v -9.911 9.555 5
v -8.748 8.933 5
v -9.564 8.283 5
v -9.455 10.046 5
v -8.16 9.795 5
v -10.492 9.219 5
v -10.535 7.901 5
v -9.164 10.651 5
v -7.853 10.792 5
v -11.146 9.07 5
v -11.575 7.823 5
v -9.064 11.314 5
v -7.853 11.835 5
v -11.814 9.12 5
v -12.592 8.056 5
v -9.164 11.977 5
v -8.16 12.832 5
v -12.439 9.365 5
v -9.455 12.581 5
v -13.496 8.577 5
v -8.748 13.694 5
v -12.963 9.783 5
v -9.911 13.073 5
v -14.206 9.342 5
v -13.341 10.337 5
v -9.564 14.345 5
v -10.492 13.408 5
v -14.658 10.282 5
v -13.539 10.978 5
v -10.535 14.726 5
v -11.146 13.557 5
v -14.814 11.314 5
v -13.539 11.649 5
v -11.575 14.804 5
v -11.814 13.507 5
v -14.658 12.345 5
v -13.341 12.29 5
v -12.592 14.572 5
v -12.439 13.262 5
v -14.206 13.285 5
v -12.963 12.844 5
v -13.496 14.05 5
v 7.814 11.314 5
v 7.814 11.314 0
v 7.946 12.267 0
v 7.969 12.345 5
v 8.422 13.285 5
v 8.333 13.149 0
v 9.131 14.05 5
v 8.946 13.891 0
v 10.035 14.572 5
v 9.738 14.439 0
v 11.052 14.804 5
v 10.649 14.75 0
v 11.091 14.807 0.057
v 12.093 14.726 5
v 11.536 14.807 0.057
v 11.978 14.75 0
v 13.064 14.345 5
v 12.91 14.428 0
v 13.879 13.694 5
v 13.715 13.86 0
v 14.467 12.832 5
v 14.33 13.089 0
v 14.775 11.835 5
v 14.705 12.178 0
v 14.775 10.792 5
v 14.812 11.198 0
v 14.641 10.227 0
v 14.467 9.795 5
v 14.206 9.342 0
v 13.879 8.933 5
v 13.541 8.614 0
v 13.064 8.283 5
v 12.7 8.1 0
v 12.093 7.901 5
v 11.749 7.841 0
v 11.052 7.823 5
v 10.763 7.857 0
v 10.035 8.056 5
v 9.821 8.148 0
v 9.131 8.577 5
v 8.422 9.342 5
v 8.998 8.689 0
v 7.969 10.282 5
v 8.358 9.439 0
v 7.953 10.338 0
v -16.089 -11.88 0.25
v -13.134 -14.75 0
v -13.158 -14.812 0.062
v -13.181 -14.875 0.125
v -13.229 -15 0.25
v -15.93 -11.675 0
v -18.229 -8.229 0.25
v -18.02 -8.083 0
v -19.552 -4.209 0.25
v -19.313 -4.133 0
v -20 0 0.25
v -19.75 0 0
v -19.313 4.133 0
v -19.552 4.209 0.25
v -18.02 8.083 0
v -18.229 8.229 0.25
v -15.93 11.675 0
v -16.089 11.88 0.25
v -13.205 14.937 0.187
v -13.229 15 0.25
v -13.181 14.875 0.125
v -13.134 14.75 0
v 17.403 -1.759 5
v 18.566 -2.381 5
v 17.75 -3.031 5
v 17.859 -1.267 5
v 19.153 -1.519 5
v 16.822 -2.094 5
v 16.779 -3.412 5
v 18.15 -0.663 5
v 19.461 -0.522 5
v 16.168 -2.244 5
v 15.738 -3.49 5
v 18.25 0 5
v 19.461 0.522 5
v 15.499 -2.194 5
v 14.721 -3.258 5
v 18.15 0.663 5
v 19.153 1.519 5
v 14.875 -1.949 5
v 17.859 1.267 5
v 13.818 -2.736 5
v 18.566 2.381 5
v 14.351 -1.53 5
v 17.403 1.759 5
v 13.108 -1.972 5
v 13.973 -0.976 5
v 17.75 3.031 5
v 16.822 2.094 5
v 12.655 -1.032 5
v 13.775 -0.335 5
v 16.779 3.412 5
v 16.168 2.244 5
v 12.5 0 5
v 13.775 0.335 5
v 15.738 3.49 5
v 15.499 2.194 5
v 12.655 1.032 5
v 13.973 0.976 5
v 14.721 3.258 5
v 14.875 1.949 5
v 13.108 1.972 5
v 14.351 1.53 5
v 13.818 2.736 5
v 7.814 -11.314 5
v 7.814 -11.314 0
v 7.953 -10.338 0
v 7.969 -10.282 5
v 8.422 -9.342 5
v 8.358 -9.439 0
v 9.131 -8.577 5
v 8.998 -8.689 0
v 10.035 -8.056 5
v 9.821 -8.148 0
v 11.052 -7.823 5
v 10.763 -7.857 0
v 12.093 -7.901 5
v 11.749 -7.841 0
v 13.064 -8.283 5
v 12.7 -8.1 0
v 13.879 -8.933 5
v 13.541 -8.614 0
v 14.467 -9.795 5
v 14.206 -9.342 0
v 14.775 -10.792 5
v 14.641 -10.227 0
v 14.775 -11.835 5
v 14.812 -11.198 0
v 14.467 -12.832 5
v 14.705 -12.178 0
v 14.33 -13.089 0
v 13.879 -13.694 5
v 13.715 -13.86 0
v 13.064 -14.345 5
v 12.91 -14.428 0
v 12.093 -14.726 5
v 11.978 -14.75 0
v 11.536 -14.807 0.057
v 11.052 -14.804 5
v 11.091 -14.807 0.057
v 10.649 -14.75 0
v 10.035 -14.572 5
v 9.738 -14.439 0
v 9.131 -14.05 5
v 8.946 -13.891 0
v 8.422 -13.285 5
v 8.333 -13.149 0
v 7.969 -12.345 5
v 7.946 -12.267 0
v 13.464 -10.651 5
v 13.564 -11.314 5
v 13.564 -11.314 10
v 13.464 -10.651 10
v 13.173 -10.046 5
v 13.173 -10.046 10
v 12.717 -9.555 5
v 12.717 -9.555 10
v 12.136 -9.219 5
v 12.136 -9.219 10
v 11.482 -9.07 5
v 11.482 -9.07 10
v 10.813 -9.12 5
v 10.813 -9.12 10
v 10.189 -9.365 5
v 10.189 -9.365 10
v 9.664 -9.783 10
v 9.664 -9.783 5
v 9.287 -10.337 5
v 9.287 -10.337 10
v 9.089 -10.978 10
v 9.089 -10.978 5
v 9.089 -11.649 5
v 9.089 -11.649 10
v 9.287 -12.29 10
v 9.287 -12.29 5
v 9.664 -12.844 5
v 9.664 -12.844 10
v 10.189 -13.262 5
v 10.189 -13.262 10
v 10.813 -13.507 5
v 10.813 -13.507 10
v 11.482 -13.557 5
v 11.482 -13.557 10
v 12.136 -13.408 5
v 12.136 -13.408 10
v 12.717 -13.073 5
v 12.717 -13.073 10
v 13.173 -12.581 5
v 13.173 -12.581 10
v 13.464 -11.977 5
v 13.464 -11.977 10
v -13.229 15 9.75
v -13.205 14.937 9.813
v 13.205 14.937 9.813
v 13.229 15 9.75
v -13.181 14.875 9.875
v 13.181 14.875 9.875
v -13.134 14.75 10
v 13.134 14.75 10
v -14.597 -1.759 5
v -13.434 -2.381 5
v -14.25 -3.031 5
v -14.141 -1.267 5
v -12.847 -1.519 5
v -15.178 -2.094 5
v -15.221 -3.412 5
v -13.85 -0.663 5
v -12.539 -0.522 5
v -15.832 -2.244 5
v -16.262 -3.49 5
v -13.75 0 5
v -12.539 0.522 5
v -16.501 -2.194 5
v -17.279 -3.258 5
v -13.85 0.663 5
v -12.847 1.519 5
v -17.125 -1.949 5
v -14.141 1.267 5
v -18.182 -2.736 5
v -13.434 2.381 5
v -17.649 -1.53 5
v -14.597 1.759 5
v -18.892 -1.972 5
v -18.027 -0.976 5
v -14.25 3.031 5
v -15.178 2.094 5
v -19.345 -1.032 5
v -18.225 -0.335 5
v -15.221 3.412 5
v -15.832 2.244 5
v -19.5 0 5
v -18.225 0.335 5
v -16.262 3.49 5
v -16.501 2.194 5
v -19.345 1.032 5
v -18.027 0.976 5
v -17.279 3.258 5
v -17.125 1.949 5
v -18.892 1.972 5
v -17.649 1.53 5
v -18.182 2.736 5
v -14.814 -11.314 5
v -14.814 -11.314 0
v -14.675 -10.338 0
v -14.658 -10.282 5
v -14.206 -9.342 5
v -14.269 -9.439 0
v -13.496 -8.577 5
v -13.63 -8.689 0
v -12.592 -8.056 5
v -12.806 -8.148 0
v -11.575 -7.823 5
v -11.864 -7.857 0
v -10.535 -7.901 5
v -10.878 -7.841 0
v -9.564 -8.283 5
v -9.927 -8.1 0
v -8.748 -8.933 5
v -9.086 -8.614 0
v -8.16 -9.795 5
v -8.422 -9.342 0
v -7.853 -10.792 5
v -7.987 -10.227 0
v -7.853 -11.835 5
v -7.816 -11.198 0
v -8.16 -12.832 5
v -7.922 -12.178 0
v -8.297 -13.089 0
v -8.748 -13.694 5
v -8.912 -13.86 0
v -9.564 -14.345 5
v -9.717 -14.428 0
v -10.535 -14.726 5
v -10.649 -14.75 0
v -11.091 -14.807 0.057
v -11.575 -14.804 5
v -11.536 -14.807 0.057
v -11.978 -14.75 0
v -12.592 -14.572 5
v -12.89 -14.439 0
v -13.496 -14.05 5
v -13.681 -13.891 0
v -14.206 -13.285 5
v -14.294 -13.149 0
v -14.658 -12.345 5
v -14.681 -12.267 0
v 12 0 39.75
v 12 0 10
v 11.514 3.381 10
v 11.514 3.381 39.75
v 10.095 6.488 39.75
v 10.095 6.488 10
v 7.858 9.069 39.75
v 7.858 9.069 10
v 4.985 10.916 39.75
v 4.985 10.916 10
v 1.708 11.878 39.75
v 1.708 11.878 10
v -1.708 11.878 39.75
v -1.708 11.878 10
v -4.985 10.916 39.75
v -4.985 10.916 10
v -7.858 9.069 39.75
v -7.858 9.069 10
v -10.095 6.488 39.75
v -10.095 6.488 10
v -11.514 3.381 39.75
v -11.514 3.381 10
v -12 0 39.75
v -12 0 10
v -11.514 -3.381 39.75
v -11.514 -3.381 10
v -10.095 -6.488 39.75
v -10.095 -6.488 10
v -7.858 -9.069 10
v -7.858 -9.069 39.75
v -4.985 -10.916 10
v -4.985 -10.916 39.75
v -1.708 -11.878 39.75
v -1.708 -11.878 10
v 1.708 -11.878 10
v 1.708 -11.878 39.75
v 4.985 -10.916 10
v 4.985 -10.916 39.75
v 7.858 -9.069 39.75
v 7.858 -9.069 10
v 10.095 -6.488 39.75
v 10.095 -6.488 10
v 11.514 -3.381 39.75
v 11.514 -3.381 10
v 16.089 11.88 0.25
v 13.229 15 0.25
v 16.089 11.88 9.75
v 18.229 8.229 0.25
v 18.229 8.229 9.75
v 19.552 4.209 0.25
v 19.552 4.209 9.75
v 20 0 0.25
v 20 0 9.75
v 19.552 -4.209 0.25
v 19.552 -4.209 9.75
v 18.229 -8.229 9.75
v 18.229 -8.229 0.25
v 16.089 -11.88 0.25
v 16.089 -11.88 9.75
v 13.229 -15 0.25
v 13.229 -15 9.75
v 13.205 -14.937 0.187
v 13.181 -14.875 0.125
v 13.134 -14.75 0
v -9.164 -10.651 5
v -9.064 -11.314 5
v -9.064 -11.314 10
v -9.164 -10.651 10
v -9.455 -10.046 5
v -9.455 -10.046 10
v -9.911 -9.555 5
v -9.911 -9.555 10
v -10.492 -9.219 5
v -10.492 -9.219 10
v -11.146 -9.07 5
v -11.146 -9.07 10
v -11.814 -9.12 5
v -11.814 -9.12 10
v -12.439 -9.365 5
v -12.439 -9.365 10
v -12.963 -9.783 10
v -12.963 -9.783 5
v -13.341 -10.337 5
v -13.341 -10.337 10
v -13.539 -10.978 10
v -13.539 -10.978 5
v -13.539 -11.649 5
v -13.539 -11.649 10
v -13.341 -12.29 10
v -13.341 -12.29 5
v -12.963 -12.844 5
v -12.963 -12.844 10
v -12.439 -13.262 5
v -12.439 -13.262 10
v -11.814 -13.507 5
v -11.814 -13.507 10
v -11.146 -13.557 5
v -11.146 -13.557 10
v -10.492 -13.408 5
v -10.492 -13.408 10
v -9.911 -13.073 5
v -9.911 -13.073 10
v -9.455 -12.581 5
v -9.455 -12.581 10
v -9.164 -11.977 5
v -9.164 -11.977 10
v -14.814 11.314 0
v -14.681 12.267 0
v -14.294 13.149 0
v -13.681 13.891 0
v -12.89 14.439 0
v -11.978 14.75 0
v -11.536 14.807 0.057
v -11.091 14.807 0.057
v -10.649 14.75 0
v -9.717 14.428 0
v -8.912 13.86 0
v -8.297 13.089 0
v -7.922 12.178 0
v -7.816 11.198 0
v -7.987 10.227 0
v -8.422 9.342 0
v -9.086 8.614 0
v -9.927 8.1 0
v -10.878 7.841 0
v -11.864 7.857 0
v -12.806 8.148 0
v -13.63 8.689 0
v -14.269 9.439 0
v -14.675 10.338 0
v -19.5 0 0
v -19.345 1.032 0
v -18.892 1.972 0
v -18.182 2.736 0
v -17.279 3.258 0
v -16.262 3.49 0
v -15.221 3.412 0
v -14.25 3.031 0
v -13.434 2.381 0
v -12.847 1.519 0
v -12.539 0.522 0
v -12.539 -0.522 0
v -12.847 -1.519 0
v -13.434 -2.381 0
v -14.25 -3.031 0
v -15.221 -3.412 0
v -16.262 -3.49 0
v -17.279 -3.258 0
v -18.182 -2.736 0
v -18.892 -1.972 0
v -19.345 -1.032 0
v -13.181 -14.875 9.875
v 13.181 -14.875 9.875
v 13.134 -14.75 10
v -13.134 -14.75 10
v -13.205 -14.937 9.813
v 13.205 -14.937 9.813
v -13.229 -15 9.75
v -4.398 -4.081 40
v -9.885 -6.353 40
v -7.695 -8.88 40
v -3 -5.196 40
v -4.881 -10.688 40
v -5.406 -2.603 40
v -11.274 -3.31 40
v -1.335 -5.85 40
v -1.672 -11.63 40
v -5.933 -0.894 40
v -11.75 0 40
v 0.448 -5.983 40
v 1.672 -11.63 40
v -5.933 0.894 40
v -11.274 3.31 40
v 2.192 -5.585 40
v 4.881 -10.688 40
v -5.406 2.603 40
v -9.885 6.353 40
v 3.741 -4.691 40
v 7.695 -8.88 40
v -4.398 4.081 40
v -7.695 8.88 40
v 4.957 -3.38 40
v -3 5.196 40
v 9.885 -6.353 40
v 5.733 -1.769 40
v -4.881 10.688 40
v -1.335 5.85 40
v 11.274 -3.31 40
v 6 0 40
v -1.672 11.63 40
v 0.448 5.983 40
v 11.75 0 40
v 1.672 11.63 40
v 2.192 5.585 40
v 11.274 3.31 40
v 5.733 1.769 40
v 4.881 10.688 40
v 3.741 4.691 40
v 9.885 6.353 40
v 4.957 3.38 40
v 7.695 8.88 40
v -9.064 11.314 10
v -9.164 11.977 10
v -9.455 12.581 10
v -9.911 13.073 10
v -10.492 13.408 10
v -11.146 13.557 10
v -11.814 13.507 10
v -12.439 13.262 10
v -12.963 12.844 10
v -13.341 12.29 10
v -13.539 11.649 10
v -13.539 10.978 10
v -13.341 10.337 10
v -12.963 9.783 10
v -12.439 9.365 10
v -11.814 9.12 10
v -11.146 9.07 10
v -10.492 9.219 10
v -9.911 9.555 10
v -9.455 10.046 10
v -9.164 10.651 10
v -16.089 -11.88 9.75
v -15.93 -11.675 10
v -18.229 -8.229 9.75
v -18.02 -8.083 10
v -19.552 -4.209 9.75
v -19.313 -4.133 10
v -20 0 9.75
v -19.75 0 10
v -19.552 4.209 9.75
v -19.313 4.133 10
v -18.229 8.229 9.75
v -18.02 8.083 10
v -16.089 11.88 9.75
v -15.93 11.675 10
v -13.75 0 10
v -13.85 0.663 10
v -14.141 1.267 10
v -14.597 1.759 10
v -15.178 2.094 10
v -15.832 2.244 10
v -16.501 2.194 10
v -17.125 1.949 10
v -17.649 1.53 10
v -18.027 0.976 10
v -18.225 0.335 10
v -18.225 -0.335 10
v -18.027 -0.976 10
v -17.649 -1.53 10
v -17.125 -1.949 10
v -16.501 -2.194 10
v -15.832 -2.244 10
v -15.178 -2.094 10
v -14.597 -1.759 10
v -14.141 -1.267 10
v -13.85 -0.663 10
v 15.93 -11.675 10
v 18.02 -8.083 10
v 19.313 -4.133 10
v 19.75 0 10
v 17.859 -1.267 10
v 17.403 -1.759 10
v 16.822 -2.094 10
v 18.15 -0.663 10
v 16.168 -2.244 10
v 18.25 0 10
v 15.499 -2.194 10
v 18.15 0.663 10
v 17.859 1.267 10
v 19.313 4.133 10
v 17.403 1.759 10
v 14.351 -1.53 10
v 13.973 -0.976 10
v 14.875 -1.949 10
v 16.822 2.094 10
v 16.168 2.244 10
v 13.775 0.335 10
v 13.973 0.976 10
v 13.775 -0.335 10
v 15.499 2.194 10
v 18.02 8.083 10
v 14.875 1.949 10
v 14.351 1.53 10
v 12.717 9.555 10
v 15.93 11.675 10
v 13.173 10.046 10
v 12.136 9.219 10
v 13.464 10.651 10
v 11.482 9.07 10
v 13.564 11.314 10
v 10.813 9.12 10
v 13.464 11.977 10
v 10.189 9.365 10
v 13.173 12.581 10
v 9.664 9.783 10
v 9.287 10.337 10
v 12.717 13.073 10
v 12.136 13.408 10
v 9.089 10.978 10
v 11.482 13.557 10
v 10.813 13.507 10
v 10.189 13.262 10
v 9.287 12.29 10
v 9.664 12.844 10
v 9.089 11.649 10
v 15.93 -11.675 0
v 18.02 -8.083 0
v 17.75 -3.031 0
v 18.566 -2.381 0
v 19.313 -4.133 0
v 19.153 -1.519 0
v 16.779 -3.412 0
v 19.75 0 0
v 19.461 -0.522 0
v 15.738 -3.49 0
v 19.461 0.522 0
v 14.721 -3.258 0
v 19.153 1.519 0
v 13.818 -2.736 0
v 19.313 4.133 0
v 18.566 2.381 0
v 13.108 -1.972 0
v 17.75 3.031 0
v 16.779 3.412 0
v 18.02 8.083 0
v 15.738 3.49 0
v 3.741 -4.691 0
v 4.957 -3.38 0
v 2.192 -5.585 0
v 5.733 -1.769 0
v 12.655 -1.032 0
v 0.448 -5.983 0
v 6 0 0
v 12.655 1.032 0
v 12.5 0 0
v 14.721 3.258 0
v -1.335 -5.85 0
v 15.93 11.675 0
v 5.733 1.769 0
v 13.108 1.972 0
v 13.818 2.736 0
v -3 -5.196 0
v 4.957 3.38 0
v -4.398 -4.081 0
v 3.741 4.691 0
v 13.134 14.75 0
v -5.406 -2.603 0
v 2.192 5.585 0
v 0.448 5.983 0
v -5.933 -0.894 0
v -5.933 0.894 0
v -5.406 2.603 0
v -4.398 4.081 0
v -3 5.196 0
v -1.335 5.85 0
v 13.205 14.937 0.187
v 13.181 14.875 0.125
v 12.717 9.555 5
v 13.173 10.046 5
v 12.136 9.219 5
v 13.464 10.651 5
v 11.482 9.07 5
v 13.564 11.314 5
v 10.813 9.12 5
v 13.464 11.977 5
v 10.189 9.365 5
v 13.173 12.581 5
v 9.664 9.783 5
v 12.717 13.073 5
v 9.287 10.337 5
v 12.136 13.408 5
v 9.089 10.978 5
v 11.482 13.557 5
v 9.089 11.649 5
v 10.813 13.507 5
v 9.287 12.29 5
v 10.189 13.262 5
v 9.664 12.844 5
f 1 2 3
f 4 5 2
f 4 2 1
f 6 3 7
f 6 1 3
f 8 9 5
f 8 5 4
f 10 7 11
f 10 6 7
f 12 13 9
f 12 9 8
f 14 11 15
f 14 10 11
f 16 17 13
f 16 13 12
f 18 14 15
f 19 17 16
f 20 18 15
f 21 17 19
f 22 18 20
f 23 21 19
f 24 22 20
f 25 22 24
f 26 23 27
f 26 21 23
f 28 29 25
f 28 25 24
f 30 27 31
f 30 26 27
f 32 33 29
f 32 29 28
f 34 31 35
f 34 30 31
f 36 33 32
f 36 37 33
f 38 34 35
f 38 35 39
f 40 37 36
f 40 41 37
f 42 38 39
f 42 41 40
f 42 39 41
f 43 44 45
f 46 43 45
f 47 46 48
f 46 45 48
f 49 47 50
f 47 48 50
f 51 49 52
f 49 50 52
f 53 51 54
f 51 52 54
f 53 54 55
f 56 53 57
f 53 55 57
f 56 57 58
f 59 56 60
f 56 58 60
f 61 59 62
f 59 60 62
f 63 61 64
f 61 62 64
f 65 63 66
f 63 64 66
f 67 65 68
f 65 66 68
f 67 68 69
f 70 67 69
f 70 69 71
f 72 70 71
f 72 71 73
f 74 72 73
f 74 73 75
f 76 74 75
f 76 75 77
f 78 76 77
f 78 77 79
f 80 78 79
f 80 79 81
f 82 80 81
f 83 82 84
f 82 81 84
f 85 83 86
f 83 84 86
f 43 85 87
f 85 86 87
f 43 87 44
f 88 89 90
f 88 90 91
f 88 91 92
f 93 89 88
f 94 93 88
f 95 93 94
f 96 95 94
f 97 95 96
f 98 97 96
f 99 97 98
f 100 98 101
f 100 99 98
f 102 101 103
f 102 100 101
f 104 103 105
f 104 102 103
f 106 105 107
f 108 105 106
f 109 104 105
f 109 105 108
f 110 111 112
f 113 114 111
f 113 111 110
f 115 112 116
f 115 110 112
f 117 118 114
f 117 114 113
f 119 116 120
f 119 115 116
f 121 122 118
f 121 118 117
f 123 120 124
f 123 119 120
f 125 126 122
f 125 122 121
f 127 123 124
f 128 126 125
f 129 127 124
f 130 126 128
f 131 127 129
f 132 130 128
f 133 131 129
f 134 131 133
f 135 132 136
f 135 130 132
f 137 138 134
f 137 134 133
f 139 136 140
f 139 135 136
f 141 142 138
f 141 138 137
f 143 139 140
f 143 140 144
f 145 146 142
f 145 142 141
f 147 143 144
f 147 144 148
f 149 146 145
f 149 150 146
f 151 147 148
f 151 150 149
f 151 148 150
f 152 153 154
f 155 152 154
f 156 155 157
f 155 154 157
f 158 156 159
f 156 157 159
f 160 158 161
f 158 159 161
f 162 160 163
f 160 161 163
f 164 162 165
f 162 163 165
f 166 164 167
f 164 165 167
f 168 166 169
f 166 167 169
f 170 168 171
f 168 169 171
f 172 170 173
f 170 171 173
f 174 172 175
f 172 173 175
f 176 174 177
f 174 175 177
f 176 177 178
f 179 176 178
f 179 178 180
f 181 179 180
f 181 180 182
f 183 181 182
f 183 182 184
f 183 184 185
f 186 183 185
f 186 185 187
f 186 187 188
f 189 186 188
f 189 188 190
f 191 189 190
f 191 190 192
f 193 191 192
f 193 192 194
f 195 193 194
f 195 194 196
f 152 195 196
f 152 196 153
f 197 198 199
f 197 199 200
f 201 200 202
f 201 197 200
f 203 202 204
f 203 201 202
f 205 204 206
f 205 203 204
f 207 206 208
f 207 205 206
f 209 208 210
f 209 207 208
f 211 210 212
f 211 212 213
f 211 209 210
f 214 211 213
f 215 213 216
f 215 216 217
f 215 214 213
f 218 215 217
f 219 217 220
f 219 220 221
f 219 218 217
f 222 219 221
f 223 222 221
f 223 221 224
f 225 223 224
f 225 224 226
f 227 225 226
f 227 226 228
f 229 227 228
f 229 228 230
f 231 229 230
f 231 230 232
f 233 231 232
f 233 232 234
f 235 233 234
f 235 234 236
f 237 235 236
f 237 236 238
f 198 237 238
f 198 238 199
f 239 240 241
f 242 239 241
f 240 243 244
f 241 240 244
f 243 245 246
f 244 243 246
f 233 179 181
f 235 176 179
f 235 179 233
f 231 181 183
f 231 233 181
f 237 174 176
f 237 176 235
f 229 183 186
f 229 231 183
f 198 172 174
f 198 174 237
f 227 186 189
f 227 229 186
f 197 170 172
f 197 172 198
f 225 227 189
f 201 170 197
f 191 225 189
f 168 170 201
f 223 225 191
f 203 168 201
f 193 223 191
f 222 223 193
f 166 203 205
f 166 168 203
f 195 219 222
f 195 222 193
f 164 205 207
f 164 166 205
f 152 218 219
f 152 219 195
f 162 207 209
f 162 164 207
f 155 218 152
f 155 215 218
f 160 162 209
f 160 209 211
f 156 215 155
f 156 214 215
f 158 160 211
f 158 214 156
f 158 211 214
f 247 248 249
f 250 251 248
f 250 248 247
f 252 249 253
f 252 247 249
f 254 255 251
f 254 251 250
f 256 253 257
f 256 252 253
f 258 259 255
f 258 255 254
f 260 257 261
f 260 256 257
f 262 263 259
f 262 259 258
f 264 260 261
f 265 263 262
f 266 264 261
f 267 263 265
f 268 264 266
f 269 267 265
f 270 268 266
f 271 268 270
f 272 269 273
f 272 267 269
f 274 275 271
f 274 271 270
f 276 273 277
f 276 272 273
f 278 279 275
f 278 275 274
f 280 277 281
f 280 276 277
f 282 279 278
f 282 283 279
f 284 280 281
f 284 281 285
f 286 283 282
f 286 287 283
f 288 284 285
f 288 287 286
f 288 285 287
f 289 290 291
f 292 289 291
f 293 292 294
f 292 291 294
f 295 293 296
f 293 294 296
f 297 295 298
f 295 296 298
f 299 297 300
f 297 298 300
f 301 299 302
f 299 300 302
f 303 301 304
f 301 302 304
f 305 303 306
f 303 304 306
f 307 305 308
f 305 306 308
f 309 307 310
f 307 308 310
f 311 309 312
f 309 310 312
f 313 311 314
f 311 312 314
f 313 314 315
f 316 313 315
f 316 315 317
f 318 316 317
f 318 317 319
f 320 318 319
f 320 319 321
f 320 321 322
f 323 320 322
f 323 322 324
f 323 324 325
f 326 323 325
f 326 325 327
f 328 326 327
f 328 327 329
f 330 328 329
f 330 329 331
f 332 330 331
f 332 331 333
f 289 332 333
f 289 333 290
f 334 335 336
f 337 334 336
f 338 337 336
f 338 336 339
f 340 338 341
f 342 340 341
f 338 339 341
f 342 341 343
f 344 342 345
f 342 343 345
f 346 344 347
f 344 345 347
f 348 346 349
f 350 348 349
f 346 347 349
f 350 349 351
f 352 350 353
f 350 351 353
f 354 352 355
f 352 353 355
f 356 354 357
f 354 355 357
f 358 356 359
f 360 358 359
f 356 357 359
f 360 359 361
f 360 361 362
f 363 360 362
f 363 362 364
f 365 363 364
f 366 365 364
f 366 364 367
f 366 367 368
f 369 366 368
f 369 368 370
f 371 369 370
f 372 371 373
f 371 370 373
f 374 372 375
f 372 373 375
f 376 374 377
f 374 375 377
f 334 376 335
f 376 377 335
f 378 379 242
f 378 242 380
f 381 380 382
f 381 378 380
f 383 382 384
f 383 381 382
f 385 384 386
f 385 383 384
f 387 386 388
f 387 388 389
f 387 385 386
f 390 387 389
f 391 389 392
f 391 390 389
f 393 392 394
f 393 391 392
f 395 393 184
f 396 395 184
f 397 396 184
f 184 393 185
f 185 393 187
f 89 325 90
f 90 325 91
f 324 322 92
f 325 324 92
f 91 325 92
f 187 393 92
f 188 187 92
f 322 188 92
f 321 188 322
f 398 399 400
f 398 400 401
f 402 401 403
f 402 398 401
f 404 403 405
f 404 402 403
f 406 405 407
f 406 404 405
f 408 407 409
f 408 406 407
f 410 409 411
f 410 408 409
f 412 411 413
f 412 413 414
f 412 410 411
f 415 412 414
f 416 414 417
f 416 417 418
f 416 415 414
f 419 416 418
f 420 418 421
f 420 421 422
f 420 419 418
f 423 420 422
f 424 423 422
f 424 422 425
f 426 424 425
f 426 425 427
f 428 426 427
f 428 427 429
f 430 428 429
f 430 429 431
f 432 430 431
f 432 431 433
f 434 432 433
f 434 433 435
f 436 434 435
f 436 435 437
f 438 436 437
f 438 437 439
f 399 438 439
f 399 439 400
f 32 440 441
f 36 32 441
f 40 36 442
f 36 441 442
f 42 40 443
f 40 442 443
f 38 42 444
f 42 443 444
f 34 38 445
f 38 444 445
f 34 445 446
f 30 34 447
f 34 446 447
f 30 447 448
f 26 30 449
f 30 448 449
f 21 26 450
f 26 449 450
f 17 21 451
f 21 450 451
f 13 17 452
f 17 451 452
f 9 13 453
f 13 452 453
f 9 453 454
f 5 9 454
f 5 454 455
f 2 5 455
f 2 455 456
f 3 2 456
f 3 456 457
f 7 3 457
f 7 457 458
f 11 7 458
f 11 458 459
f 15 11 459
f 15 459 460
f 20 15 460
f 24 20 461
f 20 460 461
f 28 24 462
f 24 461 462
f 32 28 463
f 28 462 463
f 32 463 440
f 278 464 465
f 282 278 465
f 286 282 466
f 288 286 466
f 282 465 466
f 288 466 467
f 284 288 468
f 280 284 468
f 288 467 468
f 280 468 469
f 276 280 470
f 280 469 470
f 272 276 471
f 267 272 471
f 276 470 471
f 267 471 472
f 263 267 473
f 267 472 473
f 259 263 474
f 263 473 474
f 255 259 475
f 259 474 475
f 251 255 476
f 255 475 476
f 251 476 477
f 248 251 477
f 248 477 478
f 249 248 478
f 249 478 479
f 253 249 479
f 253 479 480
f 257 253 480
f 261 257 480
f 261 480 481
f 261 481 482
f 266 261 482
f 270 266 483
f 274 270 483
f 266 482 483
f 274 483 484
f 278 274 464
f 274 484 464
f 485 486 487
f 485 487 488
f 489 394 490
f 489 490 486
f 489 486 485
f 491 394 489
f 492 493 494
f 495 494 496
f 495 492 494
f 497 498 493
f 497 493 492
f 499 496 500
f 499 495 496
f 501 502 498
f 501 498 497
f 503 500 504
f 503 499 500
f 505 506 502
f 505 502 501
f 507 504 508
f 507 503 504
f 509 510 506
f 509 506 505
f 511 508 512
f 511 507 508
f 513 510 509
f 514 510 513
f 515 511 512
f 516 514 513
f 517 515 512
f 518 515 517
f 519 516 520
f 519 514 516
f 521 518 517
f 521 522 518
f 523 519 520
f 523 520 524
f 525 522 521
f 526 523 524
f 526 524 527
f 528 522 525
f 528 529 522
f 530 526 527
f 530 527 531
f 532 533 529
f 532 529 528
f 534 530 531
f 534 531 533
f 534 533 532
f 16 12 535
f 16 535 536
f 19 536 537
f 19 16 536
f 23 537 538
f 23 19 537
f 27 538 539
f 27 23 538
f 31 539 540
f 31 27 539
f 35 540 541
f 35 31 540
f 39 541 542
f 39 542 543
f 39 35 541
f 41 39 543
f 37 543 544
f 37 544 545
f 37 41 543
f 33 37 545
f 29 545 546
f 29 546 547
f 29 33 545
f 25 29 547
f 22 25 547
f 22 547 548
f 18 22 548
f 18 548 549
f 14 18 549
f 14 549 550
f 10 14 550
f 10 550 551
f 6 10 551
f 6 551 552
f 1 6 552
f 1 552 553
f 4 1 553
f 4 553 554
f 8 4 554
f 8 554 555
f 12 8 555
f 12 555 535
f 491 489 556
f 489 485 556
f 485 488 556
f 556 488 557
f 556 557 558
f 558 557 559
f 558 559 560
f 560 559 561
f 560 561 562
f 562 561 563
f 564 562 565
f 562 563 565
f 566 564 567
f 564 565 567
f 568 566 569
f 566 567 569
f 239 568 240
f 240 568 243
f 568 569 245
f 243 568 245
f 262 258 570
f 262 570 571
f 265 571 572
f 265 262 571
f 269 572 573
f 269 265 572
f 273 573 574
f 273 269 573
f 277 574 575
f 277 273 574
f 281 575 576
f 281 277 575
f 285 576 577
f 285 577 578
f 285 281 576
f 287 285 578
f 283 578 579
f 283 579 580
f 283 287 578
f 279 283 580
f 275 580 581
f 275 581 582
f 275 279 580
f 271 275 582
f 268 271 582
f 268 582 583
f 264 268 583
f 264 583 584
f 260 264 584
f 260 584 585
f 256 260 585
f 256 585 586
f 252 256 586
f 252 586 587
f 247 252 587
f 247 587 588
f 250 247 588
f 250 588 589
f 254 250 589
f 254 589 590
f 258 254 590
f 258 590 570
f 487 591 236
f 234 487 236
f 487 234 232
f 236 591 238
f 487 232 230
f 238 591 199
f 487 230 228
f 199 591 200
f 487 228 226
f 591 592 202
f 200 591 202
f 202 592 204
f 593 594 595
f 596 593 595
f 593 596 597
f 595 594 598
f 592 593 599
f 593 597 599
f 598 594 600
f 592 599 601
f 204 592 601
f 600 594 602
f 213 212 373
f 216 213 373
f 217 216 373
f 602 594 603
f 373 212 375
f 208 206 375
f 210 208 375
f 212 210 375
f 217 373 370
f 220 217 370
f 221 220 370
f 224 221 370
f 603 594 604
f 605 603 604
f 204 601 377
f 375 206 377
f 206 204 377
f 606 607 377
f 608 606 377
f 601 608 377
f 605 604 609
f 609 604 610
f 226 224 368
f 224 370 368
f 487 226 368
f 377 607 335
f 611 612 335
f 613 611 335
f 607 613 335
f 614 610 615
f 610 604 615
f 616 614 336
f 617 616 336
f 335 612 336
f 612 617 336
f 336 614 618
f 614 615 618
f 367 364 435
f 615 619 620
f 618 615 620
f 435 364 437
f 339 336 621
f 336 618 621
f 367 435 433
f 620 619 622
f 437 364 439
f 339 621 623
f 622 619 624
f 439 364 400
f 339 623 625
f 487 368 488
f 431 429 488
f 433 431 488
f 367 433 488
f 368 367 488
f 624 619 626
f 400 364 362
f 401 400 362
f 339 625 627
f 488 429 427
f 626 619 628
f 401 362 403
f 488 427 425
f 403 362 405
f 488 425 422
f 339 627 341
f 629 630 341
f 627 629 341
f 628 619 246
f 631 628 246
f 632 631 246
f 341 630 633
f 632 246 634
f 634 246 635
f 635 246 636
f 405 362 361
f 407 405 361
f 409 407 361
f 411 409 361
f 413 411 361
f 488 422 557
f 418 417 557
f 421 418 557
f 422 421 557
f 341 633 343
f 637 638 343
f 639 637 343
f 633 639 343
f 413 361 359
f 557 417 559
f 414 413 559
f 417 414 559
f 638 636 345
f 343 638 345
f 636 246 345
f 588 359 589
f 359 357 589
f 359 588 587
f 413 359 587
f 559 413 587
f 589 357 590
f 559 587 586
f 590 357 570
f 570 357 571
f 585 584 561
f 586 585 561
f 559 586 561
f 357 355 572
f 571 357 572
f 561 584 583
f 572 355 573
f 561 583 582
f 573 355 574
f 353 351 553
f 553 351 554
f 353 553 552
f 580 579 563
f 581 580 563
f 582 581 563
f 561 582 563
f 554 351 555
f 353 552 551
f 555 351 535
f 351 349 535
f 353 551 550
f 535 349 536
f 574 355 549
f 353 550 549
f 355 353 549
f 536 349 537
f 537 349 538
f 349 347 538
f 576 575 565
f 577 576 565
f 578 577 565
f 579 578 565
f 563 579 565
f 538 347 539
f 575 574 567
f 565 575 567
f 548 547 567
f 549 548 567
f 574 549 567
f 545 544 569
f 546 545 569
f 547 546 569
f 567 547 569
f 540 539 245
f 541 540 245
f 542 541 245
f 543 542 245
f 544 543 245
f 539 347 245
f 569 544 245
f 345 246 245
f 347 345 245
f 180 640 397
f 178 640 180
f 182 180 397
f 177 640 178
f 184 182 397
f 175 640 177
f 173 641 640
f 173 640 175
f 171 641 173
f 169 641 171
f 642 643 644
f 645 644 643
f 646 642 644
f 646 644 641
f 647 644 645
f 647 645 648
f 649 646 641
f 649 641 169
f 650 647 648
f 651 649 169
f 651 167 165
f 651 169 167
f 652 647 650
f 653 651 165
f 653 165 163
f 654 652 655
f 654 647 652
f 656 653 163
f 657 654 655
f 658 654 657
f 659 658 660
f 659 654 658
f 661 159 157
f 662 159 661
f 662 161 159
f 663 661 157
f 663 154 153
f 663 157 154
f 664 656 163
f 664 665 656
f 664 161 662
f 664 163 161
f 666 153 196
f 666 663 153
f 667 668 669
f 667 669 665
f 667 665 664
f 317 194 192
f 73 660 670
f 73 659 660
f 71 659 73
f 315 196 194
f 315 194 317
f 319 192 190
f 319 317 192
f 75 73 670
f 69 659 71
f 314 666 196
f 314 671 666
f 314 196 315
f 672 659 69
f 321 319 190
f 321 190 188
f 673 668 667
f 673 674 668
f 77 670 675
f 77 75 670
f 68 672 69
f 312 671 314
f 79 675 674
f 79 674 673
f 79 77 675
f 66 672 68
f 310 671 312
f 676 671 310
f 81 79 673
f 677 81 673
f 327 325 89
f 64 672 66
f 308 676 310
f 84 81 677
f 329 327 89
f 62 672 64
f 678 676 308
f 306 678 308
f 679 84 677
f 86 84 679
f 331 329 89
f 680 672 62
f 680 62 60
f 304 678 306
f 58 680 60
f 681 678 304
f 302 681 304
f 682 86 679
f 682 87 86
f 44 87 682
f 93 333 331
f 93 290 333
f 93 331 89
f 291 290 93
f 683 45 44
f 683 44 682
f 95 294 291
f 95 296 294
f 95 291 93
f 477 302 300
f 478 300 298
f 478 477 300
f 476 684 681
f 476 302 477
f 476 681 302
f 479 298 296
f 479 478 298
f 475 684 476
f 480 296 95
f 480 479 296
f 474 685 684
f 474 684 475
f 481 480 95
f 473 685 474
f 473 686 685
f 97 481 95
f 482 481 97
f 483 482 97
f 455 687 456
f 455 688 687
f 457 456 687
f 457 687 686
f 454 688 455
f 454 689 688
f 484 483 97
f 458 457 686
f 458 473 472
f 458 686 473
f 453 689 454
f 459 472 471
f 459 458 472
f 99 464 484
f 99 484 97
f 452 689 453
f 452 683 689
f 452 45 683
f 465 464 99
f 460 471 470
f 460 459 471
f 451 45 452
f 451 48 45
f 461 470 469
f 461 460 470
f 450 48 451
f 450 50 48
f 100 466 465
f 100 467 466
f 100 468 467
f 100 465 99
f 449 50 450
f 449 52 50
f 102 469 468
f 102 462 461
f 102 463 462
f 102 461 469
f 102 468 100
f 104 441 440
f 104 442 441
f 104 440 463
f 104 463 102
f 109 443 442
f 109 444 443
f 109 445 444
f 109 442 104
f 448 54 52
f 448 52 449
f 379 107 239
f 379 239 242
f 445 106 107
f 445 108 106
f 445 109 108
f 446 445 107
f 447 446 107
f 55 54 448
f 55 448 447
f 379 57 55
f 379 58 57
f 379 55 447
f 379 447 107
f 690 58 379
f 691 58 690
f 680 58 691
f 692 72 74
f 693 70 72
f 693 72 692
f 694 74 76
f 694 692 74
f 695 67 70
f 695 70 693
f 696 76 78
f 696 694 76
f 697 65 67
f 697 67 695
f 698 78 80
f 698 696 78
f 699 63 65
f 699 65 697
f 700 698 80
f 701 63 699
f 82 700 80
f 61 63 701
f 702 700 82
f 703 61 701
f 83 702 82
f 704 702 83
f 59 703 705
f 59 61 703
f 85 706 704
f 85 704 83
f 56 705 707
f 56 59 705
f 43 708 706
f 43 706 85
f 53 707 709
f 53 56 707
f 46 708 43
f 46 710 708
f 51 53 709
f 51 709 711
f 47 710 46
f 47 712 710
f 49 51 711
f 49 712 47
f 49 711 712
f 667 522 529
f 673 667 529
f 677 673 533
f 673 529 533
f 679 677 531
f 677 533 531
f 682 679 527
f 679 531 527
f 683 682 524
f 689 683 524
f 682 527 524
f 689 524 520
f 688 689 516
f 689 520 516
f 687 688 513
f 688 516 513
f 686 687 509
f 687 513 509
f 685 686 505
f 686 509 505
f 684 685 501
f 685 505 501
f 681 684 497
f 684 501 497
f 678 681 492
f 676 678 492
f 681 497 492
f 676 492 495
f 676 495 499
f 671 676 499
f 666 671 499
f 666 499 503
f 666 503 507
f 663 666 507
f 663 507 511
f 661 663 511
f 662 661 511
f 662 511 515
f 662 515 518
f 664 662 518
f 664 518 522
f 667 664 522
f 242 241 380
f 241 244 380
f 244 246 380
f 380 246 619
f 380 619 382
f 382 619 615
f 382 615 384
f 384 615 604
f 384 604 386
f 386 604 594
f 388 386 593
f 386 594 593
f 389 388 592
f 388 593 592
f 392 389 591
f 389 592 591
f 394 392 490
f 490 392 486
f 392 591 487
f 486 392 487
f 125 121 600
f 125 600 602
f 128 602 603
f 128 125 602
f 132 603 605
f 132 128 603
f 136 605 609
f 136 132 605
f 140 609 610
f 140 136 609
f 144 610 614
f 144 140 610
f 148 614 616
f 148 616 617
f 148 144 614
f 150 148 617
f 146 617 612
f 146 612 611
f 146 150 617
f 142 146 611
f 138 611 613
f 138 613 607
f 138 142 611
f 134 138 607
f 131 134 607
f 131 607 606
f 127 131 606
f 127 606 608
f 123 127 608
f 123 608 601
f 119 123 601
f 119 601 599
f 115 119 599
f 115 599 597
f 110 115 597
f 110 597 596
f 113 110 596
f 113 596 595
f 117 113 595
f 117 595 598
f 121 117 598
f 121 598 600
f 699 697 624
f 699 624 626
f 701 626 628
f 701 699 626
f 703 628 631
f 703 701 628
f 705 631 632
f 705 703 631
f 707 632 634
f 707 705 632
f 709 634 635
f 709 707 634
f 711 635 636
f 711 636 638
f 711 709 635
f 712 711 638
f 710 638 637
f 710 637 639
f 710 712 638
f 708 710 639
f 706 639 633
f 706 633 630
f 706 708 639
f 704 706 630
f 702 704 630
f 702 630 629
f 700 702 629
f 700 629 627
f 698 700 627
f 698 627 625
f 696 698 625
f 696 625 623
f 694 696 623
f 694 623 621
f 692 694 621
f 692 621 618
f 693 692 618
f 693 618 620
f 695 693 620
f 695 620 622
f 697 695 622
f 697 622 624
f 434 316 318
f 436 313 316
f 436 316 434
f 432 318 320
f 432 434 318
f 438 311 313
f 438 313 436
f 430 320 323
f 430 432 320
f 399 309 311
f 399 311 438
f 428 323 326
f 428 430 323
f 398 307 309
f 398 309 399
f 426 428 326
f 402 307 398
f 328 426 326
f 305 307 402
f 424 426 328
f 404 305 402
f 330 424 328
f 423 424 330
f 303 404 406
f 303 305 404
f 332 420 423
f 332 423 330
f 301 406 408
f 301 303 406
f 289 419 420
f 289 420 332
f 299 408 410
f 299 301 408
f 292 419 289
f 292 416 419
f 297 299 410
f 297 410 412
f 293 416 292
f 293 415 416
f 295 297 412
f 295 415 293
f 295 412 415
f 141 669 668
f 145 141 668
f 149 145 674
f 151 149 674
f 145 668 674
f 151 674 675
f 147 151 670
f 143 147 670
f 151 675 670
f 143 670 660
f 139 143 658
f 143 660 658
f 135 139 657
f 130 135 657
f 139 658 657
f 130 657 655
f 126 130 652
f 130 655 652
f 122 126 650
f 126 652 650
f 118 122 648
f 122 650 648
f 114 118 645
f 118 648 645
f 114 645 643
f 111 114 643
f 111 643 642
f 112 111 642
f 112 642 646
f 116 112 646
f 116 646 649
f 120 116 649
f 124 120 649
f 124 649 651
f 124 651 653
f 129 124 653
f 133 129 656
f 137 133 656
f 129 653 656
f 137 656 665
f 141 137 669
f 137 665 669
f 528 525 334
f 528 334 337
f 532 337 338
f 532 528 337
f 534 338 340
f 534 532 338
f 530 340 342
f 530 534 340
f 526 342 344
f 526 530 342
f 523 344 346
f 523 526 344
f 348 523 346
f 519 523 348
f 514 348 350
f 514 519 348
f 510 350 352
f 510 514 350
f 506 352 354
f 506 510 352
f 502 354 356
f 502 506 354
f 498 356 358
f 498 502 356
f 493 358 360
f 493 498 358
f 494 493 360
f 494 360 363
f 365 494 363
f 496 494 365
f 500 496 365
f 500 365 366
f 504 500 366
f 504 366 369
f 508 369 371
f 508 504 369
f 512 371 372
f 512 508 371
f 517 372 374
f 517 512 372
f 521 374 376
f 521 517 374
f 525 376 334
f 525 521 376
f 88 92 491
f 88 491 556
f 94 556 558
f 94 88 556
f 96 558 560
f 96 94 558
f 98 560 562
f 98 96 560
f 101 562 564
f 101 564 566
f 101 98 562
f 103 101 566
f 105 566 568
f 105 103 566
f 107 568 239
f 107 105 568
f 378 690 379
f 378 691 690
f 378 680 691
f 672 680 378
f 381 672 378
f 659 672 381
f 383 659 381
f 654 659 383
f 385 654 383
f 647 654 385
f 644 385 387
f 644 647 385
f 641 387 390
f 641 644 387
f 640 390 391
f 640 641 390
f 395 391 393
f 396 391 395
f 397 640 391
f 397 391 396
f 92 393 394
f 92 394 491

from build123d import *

# Parameters (mm, degrees)
SKETCH1_R           = 2.25
BOSS_EXTRUDE1_DEPTH = 10
SKETCH2_R           = 12
BOSS_EXTRUDE2_DEPTH = 30
SKETCH3_R           = 6
CUT_EXTRUDE1_DEPTH  = 48.16990566
CHAMFER1_SIZE       = 0.25
SKETCH4_R           = 3.5
CUT_EXTRUDE2_DEPTH  = 5


with BuildPart() as part:
    # Sketch1 → Boss-Extrude1 (new body)
    with BuildSketch(Plane.XY):
        with BuildLine():
            Line((-13.228756555, 15), (13.228756555, 15))
            ThreePointArc((13.228756555, 15), (20, 0), (13.228756555, -15))
            Line((13.228756555, -15), (-13.228756555, -15))
            ThreePointArc((-13.228756555, -15), (-20, 0), (-13.228756555, 15))
        make_face()
        with Locations((-16, 0)):
            Circle(SKETCH1_R, mode=Mode.SUBTRACT)
        with Locations((-11.313708499, 11.313708499)):
            Circle(SKETCH1_R, mode=Mode.SUBTRACT)
        with Locations((11.313708499, 11.313708499)):
            Circle(SKETCH1_R, mode=Mode.SUBTRACT)
        with Locations((16, 0)):
            Circle(SKETCH1_R, mode=Mode.SUBTRACT)
        with Locations((11.313708499, -11.313708499)):
            Circle(SKETCH1_R, mode=Mode.SUBTRACT)
        with Locations((-11.313708499, -11.313708499)):
            Circle(SKETCH1_R, mode=Mode.SUBTRACT)
    extrude(amount=BOSS_EXTRUDE1_DEPTH)

    # Sketch2 → Boss-Extrude2 (add)
    with BuildSketch(Plane.XY.offset(10)):
        Circle(SKETCH2_R)
    extrude(amount=BOSS_EXTRUDE2_DEPTH)

    # Sketch3 → Cut-Extrude1 (cut, through all)
    with BuildSketch(Plane.XY.offset(40)):
        Circle(SKETCH3_R)
    extrude(amount=-CUT_EXTRUDE1_DEPTH, mode=Mode.SUBTRACT)

    # Chamfer1
    chamfer1_edges = [part.edges().sort_by_distance(p)[0] for p in [
        (20, 0, 10),
        (0, 15, 10),
        (-12, 0, 40),
        (-20, 0, 10),
        (0, 15, 0),
        (20, 0, 0),
        (0, -15, 0),
        (-20, 0, 0),
        (0, -15, 10),
    ]]
    chamfer(chamfer1_edges, length=CHAMFER1_SIZE)

    # Sketch4 → Cut-Extrude2 (cut)
    with BuildSketch(Plane(origin=(0, 0, 0), x_dir=(-1, 0, 0), z_dir=(0, 0, -1))):
        with Locations((-11.313708499, 11.313708499)):
            Circle(SKETCH4_R)
        with Locations((11.313708499, 11.313708499)):
            Circle(SKETCH4_R)
        with Locations((16, 0)):
            Circle(SKETCH4_R)
        with Locations((11.313708499, -11.313708499)):
            Circle(SKETCH4_R)
        with Locations((-11.313708499, -11.313708499)):
            Circle(SKETCH4_R)
        with Locations((-16, 0)):
            Circle(SKETCH4_R)
    extrude(amount=-CUT_EXTRUDE2_DEPTH, mode=Mode.SUBTRACT)


solid = part.part
